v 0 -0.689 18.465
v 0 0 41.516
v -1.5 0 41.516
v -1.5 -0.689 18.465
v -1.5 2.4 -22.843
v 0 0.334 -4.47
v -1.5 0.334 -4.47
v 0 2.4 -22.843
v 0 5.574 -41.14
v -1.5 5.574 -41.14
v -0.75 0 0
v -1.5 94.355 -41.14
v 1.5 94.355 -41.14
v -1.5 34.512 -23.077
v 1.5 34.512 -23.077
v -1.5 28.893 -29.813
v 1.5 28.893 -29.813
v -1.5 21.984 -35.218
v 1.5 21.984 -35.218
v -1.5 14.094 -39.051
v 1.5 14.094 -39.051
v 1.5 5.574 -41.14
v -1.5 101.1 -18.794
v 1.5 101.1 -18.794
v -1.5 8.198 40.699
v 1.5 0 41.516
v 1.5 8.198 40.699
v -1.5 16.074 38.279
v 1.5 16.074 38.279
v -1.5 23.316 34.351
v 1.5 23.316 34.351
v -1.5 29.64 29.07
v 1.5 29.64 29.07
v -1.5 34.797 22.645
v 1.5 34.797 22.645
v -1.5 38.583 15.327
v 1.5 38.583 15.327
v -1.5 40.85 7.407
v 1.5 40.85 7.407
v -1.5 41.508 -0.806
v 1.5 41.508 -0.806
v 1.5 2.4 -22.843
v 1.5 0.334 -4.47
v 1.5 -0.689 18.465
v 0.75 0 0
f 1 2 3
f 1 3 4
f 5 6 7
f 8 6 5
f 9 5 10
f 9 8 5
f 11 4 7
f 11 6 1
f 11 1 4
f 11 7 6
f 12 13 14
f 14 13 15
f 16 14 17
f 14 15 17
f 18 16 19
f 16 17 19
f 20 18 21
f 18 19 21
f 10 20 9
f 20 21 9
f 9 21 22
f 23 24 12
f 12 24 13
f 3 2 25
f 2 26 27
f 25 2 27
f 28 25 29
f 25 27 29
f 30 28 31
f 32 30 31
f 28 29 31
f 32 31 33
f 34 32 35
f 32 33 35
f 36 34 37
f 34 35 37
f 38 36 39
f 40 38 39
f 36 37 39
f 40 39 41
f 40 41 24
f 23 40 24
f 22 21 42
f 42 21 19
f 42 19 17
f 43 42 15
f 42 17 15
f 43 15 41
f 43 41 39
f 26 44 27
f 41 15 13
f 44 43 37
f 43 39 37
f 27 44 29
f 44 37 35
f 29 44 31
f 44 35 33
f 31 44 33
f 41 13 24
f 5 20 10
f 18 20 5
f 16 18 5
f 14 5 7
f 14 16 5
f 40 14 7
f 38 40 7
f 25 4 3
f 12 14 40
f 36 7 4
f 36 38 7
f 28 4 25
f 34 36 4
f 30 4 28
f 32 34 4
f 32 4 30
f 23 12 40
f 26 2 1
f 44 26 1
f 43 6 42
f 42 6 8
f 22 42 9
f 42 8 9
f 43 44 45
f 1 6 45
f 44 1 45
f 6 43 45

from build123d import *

# Parameters (mm, degrees)
BOSS_EXTRUDE1_DEPTH = 1.5


with BuildPart() as part:
    # Sketch1 (on Right Plane) → Boss-Extrude1 (new body, symmetric)
    with BuildSketch(Plane(origin=(0, 0, 0), x_dir=(0, 0, -1), z_dir=(1, 0, 0))):
        with BuildLine():
            Line((41.140439709, 94.354710036), (23.076518975, 34.512005167))
            ThreePointArc((23.076518975, 34.512005167), (35.21800412, 21.984003604), (41.140439709, 5.573907889))
            add(Edge.make_bspline(
                [(-41.516312801, 0), (0.187936546, -2.786953944), (41.140439709, 5.573907889)],
                knots=[0, 0, 0, 1, 1, 1], degree=2))
            ThreePointArc((-41.516312801, 0), (-29.070108459, 29.640057739), (0.805992023, 41.508488355))
            Line((0.805992023, 41.508488355), (18.79411763, 101.100096824))
            Line((18.79411763, 101.100096824), (41.140439709, 94.354710036))
        make_face()
    extrude(amount=BOSS_EXTRUDE1_DEPTH, both=True)


solid = part.part
